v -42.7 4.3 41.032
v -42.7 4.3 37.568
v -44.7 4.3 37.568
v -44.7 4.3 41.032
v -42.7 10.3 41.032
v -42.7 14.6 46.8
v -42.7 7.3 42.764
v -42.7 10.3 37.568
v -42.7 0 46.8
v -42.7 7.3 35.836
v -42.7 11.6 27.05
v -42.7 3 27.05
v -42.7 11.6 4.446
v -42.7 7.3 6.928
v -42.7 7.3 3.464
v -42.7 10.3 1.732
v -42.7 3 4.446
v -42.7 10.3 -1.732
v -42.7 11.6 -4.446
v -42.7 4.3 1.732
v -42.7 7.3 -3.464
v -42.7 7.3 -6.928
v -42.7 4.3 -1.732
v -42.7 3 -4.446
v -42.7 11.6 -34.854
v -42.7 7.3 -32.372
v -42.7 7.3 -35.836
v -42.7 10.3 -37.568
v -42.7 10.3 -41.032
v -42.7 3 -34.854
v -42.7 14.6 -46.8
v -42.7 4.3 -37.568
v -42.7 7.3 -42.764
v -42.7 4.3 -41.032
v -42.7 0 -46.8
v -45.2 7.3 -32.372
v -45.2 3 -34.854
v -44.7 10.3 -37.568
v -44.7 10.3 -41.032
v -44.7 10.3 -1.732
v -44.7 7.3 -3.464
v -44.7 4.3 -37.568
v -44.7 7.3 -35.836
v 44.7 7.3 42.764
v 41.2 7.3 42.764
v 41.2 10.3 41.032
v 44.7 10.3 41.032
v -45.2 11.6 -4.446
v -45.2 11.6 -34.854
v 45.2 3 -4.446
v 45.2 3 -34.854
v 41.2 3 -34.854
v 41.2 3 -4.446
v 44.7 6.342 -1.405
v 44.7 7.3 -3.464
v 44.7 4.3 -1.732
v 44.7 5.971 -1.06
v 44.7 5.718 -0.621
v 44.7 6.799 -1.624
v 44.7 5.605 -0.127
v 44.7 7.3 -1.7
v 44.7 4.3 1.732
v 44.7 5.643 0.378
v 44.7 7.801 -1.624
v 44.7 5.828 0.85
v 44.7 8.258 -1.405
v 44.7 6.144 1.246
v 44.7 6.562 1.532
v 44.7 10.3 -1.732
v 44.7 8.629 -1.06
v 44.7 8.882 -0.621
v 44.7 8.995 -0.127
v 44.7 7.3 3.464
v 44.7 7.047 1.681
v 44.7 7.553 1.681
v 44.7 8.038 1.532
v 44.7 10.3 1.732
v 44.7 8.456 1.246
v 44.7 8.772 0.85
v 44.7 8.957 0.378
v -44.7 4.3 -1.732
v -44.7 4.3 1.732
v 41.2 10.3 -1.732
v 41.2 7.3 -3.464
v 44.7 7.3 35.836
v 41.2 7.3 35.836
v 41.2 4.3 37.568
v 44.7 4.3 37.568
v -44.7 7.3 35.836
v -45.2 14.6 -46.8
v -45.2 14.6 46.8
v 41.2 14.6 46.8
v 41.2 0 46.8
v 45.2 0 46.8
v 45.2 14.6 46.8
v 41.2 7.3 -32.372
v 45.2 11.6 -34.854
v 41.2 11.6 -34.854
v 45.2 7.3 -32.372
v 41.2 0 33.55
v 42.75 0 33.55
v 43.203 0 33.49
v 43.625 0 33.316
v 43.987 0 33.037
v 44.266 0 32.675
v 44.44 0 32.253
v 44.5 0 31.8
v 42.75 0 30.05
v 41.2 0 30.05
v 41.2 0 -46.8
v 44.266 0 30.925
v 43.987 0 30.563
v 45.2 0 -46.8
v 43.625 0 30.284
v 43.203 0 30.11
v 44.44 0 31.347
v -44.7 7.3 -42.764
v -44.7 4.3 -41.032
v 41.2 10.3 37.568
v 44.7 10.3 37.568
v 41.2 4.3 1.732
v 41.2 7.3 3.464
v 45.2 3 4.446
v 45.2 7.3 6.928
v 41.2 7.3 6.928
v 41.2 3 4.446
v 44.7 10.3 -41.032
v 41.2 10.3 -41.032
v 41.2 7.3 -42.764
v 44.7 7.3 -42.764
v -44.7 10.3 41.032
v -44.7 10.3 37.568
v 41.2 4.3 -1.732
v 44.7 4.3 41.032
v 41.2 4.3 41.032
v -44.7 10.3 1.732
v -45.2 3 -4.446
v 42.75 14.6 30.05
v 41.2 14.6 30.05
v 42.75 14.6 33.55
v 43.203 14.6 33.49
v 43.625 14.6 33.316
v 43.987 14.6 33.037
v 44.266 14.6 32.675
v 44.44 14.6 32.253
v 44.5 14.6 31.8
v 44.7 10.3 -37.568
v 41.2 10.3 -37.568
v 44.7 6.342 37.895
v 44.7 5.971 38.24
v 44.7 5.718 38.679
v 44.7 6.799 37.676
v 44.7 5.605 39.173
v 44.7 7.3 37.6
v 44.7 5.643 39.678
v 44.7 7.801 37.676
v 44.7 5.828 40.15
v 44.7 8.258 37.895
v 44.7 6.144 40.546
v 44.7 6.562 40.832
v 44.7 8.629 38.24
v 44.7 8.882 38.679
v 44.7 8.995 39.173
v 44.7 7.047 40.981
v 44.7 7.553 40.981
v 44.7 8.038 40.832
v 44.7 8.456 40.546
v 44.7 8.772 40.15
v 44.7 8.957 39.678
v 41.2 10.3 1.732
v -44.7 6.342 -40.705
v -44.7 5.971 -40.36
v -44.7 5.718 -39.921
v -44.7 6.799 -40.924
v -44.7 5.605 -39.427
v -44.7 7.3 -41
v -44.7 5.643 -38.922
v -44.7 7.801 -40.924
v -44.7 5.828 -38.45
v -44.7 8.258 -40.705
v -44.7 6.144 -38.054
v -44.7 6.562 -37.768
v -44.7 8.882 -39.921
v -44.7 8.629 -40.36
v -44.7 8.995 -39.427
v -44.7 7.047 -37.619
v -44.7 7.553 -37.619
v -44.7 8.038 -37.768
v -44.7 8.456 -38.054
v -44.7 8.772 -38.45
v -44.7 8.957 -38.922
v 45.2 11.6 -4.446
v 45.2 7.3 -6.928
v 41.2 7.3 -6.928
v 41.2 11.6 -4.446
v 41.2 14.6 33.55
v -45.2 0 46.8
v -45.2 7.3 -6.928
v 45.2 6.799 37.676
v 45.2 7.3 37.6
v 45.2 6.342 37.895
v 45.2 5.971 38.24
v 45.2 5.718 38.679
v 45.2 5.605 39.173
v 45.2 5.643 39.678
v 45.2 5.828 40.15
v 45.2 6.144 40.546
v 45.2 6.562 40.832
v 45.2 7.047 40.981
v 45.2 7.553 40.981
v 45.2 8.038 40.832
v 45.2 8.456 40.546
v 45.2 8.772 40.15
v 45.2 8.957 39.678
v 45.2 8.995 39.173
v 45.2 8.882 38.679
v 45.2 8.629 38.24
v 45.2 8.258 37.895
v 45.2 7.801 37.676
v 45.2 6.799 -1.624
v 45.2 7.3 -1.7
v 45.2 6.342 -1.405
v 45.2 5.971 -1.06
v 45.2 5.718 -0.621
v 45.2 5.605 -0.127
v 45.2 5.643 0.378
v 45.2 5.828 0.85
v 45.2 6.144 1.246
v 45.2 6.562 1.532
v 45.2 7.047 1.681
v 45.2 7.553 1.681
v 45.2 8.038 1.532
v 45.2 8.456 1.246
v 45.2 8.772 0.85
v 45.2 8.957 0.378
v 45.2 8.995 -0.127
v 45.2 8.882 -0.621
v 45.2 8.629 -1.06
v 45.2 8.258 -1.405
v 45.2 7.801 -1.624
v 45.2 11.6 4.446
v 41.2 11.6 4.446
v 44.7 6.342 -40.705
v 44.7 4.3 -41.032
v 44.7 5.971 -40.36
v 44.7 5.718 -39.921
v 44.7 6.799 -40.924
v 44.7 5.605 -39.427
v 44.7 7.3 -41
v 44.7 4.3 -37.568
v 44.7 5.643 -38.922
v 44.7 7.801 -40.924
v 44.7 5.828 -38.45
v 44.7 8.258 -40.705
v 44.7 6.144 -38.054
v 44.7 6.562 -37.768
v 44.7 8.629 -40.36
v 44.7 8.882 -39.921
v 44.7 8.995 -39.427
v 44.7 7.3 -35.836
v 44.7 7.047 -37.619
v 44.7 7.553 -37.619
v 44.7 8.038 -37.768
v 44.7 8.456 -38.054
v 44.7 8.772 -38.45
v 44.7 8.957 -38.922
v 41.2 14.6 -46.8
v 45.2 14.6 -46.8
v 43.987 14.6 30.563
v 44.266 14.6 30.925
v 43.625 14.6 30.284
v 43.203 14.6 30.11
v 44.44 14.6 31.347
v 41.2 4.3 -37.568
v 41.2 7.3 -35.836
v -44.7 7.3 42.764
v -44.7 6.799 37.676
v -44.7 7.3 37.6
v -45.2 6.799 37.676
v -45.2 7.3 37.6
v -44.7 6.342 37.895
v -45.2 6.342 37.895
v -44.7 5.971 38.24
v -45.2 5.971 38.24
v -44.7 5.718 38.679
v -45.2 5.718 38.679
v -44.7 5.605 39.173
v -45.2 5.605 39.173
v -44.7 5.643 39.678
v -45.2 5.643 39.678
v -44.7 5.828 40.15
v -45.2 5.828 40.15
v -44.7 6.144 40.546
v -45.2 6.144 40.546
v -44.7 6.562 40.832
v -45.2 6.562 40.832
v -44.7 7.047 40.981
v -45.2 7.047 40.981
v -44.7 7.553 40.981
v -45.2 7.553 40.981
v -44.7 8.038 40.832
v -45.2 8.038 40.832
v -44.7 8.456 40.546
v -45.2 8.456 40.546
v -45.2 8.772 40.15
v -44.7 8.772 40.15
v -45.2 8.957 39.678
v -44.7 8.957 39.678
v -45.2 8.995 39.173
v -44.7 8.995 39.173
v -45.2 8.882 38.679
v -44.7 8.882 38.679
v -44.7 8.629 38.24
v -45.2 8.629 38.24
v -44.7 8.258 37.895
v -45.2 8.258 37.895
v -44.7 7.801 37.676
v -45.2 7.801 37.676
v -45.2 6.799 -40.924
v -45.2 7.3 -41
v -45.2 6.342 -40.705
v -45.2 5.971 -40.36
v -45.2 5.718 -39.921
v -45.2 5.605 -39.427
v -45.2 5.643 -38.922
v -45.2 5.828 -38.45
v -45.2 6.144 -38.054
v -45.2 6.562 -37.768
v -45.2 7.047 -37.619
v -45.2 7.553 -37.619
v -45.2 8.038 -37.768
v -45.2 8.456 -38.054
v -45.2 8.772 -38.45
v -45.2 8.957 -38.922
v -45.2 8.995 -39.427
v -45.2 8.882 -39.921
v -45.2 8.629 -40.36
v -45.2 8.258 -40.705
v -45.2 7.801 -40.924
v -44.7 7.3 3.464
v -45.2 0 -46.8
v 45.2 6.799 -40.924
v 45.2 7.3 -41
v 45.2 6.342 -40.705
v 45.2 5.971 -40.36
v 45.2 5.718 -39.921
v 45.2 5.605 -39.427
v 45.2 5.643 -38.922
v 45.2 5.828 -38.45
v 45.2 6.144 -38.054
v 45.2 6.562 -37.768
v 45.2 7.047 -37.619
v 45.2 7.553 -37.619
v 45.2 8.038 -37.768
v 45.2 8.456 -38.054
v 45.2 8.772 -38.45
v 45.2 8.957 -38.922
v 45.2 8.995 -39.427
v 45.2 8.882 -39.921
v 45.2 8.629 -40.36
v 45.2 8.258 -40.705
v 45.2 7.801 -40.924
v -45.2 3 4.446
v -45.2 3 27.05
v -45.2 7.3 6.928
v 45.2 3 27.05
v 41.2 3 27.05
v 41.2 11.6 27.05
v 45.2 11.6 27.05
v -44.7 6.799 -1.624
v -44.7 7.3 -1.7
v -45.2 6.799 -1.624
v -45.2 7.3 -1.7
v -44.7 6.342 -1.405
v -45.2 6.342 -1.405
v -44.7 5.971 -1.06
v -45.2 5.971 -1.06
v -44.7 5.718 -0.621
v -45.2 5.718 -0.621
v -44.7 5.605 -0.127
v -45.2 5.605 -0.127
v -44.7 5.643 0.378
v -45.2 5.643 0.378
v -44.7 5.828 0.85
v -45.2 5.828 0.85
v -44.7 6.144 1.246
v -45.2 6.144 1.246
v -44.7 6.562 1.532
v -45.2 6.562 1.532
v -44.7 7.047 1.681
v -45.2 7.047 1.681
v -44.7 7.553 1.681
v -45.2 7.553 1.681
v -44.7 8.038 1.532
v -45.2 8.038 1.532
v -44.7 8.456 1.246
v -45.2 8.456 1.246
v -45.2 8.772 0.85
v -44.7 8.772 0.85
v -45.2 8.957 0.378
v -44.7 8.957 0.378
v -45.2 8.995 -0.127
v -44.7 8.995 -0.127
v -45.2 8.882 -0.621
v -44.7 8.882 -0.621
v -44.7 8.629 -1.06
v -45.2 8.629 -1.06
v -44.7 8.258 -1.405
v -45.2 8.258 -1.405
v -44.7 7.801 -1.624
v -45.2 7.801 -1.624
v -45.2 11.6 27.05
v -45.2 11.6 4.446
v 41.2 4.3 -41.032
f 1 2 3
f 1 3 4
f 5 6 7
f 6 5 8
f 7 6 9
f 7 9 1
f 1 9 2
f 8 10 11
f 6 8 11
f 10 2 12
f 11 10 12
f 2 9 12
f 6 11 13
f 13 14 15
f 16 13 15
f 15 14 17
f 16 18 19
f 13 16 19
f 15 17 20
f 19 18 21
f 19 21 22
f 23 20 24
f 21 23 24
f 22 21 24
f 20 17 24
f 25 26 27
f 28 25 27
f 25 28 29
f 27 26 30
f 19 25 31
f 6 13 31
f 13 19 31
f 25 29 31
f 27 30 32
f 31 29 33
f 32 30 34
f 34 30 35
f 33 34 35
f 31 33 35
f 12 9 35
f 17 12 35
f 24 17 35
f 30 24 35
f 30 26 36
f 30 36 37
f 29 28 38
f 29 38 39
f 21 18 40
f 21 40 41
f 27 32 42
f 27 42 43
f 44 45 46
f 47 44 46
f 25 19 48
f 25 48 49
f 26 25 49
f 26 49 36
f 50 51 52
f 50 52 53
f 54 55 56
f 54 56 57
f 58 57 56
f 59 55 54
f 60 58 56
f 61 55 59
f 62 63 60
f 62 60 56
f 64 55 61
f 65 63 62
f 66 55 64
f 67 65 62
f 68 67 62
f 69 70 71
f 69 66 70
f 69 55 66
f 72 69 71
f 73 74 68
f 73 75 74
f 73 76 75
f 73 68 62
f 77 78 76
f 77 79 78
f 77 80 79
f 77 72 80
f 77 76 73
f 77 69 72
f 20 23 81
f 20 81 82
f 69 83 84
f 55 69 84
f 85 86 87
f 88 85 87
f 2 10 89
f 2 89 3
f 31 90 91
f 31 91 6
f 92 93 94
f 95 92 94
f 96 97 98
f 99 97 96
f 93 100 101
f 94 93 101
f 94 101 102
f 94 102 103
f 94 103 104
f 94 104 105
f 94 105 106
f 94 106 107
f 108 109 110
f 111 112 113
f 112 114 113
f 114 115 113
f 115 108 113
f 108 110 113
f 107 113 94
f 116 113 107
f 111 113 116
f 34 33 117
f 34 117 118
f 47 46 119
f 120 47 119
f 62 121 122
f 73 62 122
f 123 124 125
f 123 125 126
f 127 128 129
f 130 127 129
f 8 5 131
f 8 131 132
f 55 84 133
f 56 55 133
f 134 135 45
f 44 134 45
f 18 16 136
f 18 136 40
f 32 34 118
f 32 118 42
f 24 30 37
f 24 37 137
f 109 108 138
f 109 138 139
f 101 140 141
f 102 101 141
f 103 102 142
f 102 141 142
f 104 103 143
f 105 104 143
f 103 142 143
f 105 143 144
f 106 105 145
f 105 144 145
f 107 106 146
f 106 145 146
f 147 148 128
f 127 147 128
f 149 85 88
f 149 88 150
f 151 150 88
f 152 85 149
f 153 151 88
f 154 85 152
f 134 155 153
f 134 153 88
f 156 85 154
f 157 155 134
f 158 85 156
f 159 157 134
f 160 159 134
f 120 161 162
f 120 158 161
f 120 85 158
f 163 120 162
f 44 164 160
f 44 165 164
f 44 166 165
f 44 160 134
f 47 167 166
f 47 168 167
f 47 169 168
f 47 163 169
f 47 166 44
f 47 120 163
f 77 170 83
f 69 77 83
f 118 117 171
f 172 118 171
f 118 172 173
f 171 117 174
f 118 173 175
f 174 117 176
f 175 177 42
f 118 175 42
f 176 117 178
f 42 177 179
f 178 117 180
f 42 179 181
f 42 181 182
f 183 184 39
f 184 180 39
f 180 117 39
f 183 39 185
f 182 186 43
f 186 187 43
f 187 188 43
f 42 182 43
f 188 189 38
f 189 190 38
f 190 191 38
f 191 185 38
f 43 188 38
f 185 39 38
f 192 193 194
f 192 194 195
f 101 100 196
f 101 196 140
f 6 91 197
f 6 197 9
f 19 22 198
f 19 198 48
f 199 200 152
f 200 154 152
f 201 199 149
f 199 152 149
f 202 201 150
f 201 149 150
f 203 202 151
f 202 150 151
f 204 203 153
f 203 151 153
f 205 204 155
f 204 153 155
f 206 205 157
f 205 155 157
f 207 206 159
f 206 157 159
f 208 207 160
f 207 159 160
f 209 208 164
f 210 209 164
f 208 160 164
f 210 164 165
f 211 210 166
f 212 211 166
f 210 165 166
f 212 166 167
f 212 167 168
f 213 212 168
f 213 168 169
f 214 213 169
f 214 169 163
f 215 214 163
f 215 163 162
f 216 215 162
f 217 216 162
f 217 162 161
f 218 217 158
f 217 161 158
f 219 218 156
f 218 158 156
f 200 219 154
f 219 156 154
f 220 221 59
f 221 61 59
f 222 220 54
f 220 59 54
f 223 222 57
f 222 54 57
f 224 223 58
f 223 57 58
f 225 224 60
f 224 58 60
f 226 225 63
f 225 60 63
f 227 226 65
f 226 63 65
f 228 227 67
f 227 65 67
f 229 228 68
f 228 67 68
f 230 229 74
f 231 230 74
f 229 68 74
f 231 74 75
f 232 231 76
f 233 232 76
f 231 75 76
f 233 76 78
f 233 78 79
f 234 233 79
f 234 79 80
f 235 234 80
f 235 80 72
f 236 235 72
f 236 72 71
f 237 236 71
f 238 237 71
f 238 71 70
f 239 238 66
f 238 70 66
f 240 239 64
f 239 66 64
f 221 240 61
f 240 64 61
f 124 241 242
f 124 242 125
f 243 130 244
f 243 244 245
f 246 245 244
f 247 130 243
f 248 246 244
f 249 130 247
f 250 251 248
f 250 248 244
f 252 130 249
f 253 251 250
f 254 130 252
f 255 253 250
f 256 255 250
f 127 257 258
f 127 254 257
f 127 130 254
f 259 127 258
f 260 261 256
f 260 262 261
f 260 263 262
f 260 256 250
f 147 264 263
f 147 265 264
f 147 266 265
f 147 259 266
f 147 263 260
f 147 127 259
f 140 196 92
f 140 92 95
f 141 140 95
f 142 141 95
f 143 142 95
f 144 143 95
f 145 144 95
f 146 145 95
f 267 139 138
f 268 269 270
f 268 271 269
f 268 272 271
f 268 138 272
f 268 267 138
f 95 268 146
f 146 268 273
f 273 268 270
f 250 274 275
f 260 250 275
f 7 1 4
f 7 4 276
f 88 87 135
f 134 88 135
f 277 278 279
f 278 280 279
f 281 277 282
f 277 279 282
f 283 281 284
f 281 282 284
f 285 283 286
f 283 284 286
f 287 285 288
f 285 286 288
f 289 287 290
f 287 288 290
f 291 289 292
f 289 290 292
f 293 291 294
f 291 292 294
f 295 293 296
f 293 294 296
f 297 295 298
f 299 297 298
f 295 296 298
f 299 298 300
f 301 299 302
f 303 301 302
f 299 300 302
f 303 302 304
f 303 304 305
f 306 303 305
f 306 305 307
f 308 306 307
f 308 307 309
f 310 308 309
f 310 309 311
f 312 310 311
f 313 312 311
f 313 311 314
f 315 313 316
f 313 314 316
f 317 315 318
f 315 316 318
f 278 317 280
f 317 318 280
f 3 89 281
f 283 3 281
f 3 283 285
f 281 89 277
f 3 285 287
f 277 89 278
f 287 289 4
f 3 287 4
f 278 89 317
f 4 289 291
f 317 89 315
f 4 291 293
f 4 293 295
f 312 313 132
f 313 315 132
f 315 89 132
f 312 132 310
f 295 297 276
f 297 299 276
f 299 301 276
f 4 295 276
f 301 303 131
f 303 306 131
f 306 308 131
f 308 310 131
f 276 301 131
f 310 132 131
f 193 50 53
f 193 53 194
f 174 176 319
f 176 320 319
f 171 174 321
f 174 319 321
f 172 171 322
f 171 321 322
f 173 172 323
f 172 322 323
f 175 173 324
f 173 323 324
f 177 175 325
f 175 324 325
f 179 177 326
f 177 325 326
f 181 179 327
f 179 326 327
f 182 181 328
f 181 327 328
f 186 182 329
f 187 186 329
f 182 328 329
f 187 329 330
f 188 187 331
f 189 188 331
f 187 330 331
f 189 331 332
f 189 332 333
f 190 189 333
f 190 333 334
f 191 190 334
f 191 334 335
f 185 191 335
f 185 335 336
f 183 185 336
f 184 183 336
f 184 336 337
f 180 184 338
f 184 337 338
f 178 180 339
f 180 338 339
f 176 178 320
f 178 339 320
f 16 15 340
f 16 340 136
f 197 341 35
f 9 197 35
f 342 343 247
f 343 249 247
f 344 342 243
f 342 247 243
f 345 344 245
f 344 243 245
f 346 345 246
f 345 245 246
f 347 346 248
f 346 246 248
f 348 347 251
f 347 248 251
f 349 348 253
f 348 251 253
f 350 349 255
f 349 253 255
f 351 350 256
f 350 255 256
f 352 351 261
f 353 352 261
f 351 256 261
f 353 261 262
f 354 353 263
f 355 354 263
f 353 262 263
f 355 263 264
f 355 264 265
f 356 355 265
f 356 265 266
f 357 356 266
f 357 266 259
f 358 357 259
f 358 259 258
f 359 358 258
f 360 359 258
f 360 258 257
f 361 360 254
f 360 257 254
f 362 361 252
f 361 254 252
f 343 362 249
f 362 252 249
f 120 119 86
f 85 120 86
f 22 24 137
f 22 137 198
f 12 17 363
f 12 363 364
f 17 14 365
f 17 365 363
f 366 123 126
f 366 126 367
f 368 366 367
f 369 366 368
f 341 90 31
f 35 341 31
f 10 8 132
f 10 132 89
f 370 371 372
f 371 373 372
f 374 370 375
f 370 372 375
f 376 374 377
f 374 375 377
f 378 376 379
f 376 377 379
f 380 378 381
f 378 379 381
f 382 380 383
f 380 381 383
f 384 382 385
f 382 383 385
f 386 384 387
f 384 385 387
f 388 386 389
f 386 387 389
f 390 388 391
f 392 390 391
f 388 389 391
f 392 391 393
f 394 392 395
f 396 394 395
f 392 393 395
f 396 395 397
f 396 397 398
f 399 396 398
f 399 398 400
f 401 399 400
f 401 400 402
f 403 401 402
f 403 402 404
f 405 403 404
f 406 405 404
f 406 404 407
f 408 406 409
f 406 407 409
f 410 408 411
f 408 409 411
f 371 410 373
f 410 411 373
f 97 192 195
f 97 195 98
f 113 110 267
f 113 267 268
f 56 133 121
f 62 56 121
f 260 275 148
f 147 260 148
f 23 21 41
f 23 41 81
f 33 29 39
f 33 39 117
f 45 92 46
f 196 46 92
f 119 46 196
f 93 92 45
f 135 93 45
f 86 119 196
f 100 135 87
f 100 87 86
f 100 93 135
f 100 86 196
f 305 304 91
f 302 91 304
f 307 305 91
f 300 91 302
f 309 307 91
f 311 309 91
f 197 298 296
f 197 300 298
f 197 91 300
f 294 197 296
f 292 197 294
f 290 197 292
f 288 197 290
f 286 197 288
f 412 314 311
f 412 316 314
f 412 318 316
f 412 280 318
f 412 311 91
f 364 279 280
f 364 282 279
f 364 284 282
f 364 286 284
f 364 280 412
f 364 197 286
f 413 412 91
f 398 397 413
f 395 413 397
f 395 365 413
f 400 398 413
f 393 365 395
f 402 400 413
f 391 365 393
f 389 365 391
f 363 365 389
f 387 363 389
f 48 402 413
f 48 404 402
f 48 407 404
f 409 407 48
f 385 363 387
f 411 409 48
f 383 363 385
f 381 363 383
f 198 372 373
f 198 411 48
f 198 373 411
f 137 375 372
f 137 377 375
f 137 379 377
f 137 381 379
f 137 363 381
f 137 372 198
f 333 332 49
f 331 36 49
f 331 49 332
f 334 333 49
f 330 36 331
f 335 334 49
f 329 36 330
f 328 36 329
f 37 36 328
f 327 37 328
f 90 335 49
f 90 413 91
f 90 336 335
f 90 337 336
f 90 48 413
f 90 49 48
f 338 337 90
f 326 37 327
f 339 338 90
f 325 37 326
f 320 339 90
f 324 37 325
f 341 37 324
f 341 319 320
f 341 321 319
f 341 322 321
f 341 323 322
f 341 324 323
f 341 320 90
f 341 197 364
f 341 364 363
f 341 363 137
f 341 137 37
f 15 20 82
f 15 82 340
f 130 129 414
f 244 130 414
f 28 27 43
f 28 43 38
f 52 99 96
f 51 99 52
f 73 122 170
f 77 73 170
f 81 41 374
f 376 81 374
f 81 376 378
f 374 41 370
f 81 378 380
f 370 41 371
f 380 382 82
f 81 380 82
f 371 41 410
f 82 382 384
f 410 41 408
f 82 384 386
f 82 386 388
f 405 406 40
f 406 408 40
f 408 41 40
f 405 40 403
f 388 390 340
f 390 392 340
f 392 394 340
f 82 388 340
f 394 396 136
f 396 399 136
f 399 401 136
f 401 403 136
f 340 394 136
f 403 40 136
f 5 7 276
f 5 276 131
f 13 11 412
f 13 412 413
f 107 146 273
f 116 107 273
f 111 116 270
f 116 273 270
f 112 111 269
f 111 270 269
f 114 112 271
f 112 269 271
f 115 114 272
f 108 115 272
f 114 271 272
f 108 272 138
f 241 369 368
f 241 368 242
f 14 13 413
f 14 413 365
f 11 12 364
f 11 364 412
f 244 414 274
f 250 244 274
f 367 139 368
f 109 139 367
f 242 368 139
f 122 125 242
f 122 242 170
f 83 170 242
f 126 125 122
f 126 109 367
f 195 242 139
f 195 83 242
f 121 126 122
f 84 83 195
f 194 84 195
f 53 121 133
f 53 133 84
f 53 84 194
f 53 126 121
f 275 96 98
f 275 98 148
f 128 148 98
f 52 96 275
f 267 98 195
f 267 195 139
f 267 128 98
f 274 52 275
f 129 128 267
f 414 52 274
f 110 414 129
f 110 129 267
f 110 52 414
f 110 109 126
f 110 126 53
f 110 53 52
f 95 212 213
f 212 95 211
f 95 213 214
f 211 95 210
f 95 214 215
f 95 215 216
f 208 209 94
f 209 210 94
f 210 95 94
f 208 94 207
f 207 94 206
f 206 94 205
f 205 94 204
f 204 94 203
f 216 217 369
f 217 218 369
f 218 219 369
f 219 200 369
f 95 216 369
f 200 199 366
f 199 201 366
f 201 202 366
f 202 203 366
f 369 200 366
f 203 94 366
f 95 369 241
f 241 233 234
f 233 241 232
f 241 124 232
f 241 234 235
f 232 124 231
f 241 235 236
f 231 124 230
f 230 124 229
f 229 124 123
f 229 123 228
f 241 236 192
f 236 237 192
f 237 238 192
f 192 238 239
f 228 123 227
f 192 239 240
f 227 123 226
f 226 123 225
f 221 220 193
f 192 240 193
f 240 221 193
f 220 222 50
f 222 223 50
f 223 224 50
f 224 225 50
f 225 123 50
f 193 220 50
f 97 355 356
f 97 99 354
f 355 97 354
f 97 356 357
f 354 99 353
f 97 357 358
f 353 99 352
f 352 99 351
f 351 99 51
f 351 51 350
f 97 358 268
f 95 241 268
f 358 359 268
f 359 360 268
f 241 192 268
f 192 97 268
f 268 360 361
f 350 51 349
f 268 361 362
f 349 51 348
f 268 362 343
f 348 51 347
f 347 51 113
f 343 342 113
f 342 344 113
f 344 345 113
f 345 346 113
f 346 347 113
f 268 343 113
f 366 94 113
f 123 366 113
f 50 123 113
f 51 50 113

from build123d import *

# Parameters (mm, degrees)
SKETCH1_W                     = 2.5
SKETCH1_H                     = 93.6
BOSS_EXTRUDE1_DEPTH           = 14.6
SKETCH1_W_2                   = 4
BOSS_EXTRUDE1_2_DEPTH         = 14.6
CUT_EXTRUDE1_DEPTH            = 67.681631654
SKETCH7_W                     = 1.7
SKETCH7_H                     = 90.4
M3_CLEARANCE_HOLE1_AT_2_COUNT = 2
M3_CLEARANCE_HOLE1_AT_2_PITCH = 39.3
M3_CLEARANCE_HOLE1_AT_3_COUNT = 2
M3_CLEARANCE_HOLE1_AT_3_PITCH = 39.3
CUT_EXTRUDE2_DEPTH            = 3.5
CUT_EXTRUDE4_DEPTH            = 100.339619488
CUT_EXTRUDE4_DEPTH_BACK       = 100.339619488


with BuildPart() as part:
    # Sketch1 → Boss-Extrude1 (new body)
    with BuildSketch(Plane(origin=(0, 0, 0), x_dir=(1, 0, 0), z_dir=(0, 1, 0))):
        with Locations((-43.95, 0)):
            Rectangle(SKETCH1_W, SKETCH1_H)
    extrude(amount=BOSS_EXTRUDE1_DEPTH)


with BuildPart() as body_2:
    # Sketch1 → Boss-Extrude1 2 (new body)
    with BuildSketch(Plane(origin=(0, 0, 0), x_dir=(1, 0, 0), z_dir=(0, 1, 0))):
        with Locations((43.2, 0)):
            Rectangle(SKETCH1_W_2, SKETCH1_H)
    extrude(amount=BOSS_EXTRUDE1_2_DEPTH)

    # Sketch4 → Cut-Extrude1 (cut, through all)
    with BuildSketch(Plane(origin=(0, 14.6, 0), x_dir=(1, 0, 0), z_dir=(0, 1, 0))):
        with BuildLine():
            Line((42.75, -30.05), (42.75, -31.8))
            Line((42.75, -31.8), (42.75, -33.55))
            ThreePointArc((42.75, -33.55), (43.987436867, -33.037436867), (44.5, -31.8))
            ThreePointArc((44.5, -31.8), (43.987436867, -30.562563133), (42.75, -30.05))
        make_face()
        with BuildLine():
            Line((42.75, -33.55), (42.75, -31.8))
            Line((42.75, -31.8), (42.75, -30.05))
            ThreePointArc((42.75, -30.05), (41.844242505, -30.302634527), (41.2, -30.98759616))
            Line((41.2, -30.98759616), (41.2, -32.61240384))
            ThreePointArc((41.2, -32.61240384), (41.844242505, -33.297365473), (42.75, -33.55))
        make_face()
        with BuildLine():
            Line((41.2, -33.55), (42.75, -33.55))
            ThreePointArc((42.75, -33.55), (41.844242505, -33.297365473), (41.2, -32.61240384))
            Line((41.2, -32.61240384), (41.2, -33.55))
        make_face()
        with BuildLine():
            ThreePointArc((41.2, -30.98759616), (41.844242505, -30.302634527), (42.75, -30.05))
            Line((42.75, -30.05), (41.2, -30.05))
            Line((41.2, -30.05), (41.2, -30.98759616))
        make_face()
    extrude(amount=-CUT_EXTRUDE1_DEPTH, mode=Mode.SUBTRACT)


with BuildPart() as m3_clearance_hole1_tool:
    # Sketch7 → M3 Clearance Hole1 (revolve)
    with BuildSketch(Plane(origin=(45.2, 7.3, 0), x_dir=(0, 0, -1), z_dir=(0, 1, 0))):
        with Locations((0.85, 45.2)):
            Rectangle(SKETCH7_W, SKETCH7_H)
    m3_clearance_hole1 = revolve(axis=Axis((51.55, 7.3, 0), (-1, 0, 0)))


with BuildPart() as part_1:
    add(part.part)

    # M3 Clearance Hole1: cut by m3_clearance_hole1_tool
    add(m3_clearance_hole1_tool.part, mode=Mode.SUBTRACT)


with BuildPart() as body_2_1:
    add(body_2.part)

    # M3 Clearance Hole1: cut by m3_clearance_hole1_tool
    add(m3_clearance_hole1_tool.part, mode=Mode.SUBTRACT)


with BuildPart() as m3_clearance_hole1_at_2_tool:
    # M3 Clearance Hole1 at 2: M3 Clearance Hole1 ×2
    with Locations(*[(0, 0, i * M3_CLEARANCE_HOLE1_AT_2_PITCH) for i in range(1, M3_CLEARANCE_HOLE1_AT_2_COUNT)]):
        add(m3_clearance_hole1)


with BuildPart() as part_2:
    add(part_1.part)

    # M3 Clearance Hole1 at 2: cut by m3_clearance_hole1_at_2_tool
    add(m3_clearance_hole1_at_2_tool.part, mode=Mode.SUBTRACT)


with BuildPart() as body_2_2:
    add(body_2_1.part)

    # M3 Clearance Hole1 at 2: cut by m3_clearance_hole1_at_2_tool
    add(m3_clearance_hole1_at_2_tool.part, mode=Mode.SUBTRACT)


with BuildPart() as m3_clearance_hole1_at_3_tool:
    # M3 Clearance Hole1 at 3: M3 Clearance Hole1 ×2
    with Locations(*[(0, 0, -i * M3_CLEARANCE_HOLE1_AT_3_PITCH) for i in range(1, M3_CLEARANCE_HOLE1_AT_3_COUNT)]):
        add(m3_clearance_hole1)


with BuildPart() as part_3:
    add(part_2.part)

    # M3 Clearance Hole1 at 3: cut by m3_clearance_hole1_at_3_tool
    add(m3_clearance_hole1_at_3_tool.part, mode=Mode.SUBTRACT)


with BuildPart() as body_2_3:
    add(body_2_2.part)

    # M3 Clearance Hole1 at 3: cut by m3_clearance_hole1_at_3_tool
    add(m3_clearance_hole1_at_3_tool.part, mode=Mode.SUBTRACT)

    # Sketch8 → Cut-Extrude2 (cut)
    with BuildSketch(Plane.ZY.offset(-41.2)):
        Polygon((-35.835898385, 7.3), (-37.567949192, 10.3), (-41.032050808, 10.3), (-42.764101615, 7.3), (-41.032050808, 4.3), (-37.567949192, 4.3), align=None)
        Polygon((3.464101615, 7.3), (1.732050808, 10.3), (-1.732050808, 10.3), (-3.464101615, 7.3), (-1.732050808, 4.3), (1.732050808, 4.3), align=None)
        Polygon((42.764101615, 7.3), (41.032050808, 10.3), (37.567949192, 10.3), (35.835898385, 7.3), (37.567949192, 4.3), (41.032050808, 4.3), align=None)
    cut_extrude2 = extrude(amount=-CUT_EXTRUDE2_DEPTH, mode=Mode.SUBTRACT)


with BuildPart() as part_4:
    add(part_3.part)

    # Mirror1: Cut-Extrude2 across plane
    add(cut_extrude2.mirror(Plane(origin=(0, 0, 0), x_dir=(0, 0, 1), z_dir=(1, 0, 0))), mode=Mode.SUBTRACT)


with BuildPart() as cut_extrude4_tool:
    # Sketch14 → Cut-Extrude4 (new, two sides: drawn at the far end of the back side and taken through both)
    with BuildSketch(Plane.ZY.offset(-41.2).offset(-CUT_EXTRUDE4_DEPTH_BACK)):
        Polygon((-34.854402927, 3), (-4.445597073, 3), (-6.92820323, 7.3), (-4.445597073, 11.6), (-34.854402927, 11.6), (-32.37179677, 7.3), align=None)
        Polygon((4.445597073, 3), (27.05, 3), (27.05, 11.6), (4.445597073, 11.6), (6.92820323, 7.3), align=None)
    extrude(amount=CUT_EXTRUDE4_DEPTH + CUT_EXTRUDE4_DEPTH_BACK)


with BuildPart() as part_5:
    add(part_4.part)

    # Cut-Extrude4: cut by cut_extrude4_tool
    add(cut_extrude4_tool.part, mode=Mode.SUBTRACT)


with BuildPart() as body_2_4:
    add(body_2_3.part)

    # Cut-Extrude4: cut by cut_extrude4_tool
    add(cut_extrude4_tool.part, mode=Mode.SUBTRACT)


solid = Compound([part_5.part, body_2_4.part])
